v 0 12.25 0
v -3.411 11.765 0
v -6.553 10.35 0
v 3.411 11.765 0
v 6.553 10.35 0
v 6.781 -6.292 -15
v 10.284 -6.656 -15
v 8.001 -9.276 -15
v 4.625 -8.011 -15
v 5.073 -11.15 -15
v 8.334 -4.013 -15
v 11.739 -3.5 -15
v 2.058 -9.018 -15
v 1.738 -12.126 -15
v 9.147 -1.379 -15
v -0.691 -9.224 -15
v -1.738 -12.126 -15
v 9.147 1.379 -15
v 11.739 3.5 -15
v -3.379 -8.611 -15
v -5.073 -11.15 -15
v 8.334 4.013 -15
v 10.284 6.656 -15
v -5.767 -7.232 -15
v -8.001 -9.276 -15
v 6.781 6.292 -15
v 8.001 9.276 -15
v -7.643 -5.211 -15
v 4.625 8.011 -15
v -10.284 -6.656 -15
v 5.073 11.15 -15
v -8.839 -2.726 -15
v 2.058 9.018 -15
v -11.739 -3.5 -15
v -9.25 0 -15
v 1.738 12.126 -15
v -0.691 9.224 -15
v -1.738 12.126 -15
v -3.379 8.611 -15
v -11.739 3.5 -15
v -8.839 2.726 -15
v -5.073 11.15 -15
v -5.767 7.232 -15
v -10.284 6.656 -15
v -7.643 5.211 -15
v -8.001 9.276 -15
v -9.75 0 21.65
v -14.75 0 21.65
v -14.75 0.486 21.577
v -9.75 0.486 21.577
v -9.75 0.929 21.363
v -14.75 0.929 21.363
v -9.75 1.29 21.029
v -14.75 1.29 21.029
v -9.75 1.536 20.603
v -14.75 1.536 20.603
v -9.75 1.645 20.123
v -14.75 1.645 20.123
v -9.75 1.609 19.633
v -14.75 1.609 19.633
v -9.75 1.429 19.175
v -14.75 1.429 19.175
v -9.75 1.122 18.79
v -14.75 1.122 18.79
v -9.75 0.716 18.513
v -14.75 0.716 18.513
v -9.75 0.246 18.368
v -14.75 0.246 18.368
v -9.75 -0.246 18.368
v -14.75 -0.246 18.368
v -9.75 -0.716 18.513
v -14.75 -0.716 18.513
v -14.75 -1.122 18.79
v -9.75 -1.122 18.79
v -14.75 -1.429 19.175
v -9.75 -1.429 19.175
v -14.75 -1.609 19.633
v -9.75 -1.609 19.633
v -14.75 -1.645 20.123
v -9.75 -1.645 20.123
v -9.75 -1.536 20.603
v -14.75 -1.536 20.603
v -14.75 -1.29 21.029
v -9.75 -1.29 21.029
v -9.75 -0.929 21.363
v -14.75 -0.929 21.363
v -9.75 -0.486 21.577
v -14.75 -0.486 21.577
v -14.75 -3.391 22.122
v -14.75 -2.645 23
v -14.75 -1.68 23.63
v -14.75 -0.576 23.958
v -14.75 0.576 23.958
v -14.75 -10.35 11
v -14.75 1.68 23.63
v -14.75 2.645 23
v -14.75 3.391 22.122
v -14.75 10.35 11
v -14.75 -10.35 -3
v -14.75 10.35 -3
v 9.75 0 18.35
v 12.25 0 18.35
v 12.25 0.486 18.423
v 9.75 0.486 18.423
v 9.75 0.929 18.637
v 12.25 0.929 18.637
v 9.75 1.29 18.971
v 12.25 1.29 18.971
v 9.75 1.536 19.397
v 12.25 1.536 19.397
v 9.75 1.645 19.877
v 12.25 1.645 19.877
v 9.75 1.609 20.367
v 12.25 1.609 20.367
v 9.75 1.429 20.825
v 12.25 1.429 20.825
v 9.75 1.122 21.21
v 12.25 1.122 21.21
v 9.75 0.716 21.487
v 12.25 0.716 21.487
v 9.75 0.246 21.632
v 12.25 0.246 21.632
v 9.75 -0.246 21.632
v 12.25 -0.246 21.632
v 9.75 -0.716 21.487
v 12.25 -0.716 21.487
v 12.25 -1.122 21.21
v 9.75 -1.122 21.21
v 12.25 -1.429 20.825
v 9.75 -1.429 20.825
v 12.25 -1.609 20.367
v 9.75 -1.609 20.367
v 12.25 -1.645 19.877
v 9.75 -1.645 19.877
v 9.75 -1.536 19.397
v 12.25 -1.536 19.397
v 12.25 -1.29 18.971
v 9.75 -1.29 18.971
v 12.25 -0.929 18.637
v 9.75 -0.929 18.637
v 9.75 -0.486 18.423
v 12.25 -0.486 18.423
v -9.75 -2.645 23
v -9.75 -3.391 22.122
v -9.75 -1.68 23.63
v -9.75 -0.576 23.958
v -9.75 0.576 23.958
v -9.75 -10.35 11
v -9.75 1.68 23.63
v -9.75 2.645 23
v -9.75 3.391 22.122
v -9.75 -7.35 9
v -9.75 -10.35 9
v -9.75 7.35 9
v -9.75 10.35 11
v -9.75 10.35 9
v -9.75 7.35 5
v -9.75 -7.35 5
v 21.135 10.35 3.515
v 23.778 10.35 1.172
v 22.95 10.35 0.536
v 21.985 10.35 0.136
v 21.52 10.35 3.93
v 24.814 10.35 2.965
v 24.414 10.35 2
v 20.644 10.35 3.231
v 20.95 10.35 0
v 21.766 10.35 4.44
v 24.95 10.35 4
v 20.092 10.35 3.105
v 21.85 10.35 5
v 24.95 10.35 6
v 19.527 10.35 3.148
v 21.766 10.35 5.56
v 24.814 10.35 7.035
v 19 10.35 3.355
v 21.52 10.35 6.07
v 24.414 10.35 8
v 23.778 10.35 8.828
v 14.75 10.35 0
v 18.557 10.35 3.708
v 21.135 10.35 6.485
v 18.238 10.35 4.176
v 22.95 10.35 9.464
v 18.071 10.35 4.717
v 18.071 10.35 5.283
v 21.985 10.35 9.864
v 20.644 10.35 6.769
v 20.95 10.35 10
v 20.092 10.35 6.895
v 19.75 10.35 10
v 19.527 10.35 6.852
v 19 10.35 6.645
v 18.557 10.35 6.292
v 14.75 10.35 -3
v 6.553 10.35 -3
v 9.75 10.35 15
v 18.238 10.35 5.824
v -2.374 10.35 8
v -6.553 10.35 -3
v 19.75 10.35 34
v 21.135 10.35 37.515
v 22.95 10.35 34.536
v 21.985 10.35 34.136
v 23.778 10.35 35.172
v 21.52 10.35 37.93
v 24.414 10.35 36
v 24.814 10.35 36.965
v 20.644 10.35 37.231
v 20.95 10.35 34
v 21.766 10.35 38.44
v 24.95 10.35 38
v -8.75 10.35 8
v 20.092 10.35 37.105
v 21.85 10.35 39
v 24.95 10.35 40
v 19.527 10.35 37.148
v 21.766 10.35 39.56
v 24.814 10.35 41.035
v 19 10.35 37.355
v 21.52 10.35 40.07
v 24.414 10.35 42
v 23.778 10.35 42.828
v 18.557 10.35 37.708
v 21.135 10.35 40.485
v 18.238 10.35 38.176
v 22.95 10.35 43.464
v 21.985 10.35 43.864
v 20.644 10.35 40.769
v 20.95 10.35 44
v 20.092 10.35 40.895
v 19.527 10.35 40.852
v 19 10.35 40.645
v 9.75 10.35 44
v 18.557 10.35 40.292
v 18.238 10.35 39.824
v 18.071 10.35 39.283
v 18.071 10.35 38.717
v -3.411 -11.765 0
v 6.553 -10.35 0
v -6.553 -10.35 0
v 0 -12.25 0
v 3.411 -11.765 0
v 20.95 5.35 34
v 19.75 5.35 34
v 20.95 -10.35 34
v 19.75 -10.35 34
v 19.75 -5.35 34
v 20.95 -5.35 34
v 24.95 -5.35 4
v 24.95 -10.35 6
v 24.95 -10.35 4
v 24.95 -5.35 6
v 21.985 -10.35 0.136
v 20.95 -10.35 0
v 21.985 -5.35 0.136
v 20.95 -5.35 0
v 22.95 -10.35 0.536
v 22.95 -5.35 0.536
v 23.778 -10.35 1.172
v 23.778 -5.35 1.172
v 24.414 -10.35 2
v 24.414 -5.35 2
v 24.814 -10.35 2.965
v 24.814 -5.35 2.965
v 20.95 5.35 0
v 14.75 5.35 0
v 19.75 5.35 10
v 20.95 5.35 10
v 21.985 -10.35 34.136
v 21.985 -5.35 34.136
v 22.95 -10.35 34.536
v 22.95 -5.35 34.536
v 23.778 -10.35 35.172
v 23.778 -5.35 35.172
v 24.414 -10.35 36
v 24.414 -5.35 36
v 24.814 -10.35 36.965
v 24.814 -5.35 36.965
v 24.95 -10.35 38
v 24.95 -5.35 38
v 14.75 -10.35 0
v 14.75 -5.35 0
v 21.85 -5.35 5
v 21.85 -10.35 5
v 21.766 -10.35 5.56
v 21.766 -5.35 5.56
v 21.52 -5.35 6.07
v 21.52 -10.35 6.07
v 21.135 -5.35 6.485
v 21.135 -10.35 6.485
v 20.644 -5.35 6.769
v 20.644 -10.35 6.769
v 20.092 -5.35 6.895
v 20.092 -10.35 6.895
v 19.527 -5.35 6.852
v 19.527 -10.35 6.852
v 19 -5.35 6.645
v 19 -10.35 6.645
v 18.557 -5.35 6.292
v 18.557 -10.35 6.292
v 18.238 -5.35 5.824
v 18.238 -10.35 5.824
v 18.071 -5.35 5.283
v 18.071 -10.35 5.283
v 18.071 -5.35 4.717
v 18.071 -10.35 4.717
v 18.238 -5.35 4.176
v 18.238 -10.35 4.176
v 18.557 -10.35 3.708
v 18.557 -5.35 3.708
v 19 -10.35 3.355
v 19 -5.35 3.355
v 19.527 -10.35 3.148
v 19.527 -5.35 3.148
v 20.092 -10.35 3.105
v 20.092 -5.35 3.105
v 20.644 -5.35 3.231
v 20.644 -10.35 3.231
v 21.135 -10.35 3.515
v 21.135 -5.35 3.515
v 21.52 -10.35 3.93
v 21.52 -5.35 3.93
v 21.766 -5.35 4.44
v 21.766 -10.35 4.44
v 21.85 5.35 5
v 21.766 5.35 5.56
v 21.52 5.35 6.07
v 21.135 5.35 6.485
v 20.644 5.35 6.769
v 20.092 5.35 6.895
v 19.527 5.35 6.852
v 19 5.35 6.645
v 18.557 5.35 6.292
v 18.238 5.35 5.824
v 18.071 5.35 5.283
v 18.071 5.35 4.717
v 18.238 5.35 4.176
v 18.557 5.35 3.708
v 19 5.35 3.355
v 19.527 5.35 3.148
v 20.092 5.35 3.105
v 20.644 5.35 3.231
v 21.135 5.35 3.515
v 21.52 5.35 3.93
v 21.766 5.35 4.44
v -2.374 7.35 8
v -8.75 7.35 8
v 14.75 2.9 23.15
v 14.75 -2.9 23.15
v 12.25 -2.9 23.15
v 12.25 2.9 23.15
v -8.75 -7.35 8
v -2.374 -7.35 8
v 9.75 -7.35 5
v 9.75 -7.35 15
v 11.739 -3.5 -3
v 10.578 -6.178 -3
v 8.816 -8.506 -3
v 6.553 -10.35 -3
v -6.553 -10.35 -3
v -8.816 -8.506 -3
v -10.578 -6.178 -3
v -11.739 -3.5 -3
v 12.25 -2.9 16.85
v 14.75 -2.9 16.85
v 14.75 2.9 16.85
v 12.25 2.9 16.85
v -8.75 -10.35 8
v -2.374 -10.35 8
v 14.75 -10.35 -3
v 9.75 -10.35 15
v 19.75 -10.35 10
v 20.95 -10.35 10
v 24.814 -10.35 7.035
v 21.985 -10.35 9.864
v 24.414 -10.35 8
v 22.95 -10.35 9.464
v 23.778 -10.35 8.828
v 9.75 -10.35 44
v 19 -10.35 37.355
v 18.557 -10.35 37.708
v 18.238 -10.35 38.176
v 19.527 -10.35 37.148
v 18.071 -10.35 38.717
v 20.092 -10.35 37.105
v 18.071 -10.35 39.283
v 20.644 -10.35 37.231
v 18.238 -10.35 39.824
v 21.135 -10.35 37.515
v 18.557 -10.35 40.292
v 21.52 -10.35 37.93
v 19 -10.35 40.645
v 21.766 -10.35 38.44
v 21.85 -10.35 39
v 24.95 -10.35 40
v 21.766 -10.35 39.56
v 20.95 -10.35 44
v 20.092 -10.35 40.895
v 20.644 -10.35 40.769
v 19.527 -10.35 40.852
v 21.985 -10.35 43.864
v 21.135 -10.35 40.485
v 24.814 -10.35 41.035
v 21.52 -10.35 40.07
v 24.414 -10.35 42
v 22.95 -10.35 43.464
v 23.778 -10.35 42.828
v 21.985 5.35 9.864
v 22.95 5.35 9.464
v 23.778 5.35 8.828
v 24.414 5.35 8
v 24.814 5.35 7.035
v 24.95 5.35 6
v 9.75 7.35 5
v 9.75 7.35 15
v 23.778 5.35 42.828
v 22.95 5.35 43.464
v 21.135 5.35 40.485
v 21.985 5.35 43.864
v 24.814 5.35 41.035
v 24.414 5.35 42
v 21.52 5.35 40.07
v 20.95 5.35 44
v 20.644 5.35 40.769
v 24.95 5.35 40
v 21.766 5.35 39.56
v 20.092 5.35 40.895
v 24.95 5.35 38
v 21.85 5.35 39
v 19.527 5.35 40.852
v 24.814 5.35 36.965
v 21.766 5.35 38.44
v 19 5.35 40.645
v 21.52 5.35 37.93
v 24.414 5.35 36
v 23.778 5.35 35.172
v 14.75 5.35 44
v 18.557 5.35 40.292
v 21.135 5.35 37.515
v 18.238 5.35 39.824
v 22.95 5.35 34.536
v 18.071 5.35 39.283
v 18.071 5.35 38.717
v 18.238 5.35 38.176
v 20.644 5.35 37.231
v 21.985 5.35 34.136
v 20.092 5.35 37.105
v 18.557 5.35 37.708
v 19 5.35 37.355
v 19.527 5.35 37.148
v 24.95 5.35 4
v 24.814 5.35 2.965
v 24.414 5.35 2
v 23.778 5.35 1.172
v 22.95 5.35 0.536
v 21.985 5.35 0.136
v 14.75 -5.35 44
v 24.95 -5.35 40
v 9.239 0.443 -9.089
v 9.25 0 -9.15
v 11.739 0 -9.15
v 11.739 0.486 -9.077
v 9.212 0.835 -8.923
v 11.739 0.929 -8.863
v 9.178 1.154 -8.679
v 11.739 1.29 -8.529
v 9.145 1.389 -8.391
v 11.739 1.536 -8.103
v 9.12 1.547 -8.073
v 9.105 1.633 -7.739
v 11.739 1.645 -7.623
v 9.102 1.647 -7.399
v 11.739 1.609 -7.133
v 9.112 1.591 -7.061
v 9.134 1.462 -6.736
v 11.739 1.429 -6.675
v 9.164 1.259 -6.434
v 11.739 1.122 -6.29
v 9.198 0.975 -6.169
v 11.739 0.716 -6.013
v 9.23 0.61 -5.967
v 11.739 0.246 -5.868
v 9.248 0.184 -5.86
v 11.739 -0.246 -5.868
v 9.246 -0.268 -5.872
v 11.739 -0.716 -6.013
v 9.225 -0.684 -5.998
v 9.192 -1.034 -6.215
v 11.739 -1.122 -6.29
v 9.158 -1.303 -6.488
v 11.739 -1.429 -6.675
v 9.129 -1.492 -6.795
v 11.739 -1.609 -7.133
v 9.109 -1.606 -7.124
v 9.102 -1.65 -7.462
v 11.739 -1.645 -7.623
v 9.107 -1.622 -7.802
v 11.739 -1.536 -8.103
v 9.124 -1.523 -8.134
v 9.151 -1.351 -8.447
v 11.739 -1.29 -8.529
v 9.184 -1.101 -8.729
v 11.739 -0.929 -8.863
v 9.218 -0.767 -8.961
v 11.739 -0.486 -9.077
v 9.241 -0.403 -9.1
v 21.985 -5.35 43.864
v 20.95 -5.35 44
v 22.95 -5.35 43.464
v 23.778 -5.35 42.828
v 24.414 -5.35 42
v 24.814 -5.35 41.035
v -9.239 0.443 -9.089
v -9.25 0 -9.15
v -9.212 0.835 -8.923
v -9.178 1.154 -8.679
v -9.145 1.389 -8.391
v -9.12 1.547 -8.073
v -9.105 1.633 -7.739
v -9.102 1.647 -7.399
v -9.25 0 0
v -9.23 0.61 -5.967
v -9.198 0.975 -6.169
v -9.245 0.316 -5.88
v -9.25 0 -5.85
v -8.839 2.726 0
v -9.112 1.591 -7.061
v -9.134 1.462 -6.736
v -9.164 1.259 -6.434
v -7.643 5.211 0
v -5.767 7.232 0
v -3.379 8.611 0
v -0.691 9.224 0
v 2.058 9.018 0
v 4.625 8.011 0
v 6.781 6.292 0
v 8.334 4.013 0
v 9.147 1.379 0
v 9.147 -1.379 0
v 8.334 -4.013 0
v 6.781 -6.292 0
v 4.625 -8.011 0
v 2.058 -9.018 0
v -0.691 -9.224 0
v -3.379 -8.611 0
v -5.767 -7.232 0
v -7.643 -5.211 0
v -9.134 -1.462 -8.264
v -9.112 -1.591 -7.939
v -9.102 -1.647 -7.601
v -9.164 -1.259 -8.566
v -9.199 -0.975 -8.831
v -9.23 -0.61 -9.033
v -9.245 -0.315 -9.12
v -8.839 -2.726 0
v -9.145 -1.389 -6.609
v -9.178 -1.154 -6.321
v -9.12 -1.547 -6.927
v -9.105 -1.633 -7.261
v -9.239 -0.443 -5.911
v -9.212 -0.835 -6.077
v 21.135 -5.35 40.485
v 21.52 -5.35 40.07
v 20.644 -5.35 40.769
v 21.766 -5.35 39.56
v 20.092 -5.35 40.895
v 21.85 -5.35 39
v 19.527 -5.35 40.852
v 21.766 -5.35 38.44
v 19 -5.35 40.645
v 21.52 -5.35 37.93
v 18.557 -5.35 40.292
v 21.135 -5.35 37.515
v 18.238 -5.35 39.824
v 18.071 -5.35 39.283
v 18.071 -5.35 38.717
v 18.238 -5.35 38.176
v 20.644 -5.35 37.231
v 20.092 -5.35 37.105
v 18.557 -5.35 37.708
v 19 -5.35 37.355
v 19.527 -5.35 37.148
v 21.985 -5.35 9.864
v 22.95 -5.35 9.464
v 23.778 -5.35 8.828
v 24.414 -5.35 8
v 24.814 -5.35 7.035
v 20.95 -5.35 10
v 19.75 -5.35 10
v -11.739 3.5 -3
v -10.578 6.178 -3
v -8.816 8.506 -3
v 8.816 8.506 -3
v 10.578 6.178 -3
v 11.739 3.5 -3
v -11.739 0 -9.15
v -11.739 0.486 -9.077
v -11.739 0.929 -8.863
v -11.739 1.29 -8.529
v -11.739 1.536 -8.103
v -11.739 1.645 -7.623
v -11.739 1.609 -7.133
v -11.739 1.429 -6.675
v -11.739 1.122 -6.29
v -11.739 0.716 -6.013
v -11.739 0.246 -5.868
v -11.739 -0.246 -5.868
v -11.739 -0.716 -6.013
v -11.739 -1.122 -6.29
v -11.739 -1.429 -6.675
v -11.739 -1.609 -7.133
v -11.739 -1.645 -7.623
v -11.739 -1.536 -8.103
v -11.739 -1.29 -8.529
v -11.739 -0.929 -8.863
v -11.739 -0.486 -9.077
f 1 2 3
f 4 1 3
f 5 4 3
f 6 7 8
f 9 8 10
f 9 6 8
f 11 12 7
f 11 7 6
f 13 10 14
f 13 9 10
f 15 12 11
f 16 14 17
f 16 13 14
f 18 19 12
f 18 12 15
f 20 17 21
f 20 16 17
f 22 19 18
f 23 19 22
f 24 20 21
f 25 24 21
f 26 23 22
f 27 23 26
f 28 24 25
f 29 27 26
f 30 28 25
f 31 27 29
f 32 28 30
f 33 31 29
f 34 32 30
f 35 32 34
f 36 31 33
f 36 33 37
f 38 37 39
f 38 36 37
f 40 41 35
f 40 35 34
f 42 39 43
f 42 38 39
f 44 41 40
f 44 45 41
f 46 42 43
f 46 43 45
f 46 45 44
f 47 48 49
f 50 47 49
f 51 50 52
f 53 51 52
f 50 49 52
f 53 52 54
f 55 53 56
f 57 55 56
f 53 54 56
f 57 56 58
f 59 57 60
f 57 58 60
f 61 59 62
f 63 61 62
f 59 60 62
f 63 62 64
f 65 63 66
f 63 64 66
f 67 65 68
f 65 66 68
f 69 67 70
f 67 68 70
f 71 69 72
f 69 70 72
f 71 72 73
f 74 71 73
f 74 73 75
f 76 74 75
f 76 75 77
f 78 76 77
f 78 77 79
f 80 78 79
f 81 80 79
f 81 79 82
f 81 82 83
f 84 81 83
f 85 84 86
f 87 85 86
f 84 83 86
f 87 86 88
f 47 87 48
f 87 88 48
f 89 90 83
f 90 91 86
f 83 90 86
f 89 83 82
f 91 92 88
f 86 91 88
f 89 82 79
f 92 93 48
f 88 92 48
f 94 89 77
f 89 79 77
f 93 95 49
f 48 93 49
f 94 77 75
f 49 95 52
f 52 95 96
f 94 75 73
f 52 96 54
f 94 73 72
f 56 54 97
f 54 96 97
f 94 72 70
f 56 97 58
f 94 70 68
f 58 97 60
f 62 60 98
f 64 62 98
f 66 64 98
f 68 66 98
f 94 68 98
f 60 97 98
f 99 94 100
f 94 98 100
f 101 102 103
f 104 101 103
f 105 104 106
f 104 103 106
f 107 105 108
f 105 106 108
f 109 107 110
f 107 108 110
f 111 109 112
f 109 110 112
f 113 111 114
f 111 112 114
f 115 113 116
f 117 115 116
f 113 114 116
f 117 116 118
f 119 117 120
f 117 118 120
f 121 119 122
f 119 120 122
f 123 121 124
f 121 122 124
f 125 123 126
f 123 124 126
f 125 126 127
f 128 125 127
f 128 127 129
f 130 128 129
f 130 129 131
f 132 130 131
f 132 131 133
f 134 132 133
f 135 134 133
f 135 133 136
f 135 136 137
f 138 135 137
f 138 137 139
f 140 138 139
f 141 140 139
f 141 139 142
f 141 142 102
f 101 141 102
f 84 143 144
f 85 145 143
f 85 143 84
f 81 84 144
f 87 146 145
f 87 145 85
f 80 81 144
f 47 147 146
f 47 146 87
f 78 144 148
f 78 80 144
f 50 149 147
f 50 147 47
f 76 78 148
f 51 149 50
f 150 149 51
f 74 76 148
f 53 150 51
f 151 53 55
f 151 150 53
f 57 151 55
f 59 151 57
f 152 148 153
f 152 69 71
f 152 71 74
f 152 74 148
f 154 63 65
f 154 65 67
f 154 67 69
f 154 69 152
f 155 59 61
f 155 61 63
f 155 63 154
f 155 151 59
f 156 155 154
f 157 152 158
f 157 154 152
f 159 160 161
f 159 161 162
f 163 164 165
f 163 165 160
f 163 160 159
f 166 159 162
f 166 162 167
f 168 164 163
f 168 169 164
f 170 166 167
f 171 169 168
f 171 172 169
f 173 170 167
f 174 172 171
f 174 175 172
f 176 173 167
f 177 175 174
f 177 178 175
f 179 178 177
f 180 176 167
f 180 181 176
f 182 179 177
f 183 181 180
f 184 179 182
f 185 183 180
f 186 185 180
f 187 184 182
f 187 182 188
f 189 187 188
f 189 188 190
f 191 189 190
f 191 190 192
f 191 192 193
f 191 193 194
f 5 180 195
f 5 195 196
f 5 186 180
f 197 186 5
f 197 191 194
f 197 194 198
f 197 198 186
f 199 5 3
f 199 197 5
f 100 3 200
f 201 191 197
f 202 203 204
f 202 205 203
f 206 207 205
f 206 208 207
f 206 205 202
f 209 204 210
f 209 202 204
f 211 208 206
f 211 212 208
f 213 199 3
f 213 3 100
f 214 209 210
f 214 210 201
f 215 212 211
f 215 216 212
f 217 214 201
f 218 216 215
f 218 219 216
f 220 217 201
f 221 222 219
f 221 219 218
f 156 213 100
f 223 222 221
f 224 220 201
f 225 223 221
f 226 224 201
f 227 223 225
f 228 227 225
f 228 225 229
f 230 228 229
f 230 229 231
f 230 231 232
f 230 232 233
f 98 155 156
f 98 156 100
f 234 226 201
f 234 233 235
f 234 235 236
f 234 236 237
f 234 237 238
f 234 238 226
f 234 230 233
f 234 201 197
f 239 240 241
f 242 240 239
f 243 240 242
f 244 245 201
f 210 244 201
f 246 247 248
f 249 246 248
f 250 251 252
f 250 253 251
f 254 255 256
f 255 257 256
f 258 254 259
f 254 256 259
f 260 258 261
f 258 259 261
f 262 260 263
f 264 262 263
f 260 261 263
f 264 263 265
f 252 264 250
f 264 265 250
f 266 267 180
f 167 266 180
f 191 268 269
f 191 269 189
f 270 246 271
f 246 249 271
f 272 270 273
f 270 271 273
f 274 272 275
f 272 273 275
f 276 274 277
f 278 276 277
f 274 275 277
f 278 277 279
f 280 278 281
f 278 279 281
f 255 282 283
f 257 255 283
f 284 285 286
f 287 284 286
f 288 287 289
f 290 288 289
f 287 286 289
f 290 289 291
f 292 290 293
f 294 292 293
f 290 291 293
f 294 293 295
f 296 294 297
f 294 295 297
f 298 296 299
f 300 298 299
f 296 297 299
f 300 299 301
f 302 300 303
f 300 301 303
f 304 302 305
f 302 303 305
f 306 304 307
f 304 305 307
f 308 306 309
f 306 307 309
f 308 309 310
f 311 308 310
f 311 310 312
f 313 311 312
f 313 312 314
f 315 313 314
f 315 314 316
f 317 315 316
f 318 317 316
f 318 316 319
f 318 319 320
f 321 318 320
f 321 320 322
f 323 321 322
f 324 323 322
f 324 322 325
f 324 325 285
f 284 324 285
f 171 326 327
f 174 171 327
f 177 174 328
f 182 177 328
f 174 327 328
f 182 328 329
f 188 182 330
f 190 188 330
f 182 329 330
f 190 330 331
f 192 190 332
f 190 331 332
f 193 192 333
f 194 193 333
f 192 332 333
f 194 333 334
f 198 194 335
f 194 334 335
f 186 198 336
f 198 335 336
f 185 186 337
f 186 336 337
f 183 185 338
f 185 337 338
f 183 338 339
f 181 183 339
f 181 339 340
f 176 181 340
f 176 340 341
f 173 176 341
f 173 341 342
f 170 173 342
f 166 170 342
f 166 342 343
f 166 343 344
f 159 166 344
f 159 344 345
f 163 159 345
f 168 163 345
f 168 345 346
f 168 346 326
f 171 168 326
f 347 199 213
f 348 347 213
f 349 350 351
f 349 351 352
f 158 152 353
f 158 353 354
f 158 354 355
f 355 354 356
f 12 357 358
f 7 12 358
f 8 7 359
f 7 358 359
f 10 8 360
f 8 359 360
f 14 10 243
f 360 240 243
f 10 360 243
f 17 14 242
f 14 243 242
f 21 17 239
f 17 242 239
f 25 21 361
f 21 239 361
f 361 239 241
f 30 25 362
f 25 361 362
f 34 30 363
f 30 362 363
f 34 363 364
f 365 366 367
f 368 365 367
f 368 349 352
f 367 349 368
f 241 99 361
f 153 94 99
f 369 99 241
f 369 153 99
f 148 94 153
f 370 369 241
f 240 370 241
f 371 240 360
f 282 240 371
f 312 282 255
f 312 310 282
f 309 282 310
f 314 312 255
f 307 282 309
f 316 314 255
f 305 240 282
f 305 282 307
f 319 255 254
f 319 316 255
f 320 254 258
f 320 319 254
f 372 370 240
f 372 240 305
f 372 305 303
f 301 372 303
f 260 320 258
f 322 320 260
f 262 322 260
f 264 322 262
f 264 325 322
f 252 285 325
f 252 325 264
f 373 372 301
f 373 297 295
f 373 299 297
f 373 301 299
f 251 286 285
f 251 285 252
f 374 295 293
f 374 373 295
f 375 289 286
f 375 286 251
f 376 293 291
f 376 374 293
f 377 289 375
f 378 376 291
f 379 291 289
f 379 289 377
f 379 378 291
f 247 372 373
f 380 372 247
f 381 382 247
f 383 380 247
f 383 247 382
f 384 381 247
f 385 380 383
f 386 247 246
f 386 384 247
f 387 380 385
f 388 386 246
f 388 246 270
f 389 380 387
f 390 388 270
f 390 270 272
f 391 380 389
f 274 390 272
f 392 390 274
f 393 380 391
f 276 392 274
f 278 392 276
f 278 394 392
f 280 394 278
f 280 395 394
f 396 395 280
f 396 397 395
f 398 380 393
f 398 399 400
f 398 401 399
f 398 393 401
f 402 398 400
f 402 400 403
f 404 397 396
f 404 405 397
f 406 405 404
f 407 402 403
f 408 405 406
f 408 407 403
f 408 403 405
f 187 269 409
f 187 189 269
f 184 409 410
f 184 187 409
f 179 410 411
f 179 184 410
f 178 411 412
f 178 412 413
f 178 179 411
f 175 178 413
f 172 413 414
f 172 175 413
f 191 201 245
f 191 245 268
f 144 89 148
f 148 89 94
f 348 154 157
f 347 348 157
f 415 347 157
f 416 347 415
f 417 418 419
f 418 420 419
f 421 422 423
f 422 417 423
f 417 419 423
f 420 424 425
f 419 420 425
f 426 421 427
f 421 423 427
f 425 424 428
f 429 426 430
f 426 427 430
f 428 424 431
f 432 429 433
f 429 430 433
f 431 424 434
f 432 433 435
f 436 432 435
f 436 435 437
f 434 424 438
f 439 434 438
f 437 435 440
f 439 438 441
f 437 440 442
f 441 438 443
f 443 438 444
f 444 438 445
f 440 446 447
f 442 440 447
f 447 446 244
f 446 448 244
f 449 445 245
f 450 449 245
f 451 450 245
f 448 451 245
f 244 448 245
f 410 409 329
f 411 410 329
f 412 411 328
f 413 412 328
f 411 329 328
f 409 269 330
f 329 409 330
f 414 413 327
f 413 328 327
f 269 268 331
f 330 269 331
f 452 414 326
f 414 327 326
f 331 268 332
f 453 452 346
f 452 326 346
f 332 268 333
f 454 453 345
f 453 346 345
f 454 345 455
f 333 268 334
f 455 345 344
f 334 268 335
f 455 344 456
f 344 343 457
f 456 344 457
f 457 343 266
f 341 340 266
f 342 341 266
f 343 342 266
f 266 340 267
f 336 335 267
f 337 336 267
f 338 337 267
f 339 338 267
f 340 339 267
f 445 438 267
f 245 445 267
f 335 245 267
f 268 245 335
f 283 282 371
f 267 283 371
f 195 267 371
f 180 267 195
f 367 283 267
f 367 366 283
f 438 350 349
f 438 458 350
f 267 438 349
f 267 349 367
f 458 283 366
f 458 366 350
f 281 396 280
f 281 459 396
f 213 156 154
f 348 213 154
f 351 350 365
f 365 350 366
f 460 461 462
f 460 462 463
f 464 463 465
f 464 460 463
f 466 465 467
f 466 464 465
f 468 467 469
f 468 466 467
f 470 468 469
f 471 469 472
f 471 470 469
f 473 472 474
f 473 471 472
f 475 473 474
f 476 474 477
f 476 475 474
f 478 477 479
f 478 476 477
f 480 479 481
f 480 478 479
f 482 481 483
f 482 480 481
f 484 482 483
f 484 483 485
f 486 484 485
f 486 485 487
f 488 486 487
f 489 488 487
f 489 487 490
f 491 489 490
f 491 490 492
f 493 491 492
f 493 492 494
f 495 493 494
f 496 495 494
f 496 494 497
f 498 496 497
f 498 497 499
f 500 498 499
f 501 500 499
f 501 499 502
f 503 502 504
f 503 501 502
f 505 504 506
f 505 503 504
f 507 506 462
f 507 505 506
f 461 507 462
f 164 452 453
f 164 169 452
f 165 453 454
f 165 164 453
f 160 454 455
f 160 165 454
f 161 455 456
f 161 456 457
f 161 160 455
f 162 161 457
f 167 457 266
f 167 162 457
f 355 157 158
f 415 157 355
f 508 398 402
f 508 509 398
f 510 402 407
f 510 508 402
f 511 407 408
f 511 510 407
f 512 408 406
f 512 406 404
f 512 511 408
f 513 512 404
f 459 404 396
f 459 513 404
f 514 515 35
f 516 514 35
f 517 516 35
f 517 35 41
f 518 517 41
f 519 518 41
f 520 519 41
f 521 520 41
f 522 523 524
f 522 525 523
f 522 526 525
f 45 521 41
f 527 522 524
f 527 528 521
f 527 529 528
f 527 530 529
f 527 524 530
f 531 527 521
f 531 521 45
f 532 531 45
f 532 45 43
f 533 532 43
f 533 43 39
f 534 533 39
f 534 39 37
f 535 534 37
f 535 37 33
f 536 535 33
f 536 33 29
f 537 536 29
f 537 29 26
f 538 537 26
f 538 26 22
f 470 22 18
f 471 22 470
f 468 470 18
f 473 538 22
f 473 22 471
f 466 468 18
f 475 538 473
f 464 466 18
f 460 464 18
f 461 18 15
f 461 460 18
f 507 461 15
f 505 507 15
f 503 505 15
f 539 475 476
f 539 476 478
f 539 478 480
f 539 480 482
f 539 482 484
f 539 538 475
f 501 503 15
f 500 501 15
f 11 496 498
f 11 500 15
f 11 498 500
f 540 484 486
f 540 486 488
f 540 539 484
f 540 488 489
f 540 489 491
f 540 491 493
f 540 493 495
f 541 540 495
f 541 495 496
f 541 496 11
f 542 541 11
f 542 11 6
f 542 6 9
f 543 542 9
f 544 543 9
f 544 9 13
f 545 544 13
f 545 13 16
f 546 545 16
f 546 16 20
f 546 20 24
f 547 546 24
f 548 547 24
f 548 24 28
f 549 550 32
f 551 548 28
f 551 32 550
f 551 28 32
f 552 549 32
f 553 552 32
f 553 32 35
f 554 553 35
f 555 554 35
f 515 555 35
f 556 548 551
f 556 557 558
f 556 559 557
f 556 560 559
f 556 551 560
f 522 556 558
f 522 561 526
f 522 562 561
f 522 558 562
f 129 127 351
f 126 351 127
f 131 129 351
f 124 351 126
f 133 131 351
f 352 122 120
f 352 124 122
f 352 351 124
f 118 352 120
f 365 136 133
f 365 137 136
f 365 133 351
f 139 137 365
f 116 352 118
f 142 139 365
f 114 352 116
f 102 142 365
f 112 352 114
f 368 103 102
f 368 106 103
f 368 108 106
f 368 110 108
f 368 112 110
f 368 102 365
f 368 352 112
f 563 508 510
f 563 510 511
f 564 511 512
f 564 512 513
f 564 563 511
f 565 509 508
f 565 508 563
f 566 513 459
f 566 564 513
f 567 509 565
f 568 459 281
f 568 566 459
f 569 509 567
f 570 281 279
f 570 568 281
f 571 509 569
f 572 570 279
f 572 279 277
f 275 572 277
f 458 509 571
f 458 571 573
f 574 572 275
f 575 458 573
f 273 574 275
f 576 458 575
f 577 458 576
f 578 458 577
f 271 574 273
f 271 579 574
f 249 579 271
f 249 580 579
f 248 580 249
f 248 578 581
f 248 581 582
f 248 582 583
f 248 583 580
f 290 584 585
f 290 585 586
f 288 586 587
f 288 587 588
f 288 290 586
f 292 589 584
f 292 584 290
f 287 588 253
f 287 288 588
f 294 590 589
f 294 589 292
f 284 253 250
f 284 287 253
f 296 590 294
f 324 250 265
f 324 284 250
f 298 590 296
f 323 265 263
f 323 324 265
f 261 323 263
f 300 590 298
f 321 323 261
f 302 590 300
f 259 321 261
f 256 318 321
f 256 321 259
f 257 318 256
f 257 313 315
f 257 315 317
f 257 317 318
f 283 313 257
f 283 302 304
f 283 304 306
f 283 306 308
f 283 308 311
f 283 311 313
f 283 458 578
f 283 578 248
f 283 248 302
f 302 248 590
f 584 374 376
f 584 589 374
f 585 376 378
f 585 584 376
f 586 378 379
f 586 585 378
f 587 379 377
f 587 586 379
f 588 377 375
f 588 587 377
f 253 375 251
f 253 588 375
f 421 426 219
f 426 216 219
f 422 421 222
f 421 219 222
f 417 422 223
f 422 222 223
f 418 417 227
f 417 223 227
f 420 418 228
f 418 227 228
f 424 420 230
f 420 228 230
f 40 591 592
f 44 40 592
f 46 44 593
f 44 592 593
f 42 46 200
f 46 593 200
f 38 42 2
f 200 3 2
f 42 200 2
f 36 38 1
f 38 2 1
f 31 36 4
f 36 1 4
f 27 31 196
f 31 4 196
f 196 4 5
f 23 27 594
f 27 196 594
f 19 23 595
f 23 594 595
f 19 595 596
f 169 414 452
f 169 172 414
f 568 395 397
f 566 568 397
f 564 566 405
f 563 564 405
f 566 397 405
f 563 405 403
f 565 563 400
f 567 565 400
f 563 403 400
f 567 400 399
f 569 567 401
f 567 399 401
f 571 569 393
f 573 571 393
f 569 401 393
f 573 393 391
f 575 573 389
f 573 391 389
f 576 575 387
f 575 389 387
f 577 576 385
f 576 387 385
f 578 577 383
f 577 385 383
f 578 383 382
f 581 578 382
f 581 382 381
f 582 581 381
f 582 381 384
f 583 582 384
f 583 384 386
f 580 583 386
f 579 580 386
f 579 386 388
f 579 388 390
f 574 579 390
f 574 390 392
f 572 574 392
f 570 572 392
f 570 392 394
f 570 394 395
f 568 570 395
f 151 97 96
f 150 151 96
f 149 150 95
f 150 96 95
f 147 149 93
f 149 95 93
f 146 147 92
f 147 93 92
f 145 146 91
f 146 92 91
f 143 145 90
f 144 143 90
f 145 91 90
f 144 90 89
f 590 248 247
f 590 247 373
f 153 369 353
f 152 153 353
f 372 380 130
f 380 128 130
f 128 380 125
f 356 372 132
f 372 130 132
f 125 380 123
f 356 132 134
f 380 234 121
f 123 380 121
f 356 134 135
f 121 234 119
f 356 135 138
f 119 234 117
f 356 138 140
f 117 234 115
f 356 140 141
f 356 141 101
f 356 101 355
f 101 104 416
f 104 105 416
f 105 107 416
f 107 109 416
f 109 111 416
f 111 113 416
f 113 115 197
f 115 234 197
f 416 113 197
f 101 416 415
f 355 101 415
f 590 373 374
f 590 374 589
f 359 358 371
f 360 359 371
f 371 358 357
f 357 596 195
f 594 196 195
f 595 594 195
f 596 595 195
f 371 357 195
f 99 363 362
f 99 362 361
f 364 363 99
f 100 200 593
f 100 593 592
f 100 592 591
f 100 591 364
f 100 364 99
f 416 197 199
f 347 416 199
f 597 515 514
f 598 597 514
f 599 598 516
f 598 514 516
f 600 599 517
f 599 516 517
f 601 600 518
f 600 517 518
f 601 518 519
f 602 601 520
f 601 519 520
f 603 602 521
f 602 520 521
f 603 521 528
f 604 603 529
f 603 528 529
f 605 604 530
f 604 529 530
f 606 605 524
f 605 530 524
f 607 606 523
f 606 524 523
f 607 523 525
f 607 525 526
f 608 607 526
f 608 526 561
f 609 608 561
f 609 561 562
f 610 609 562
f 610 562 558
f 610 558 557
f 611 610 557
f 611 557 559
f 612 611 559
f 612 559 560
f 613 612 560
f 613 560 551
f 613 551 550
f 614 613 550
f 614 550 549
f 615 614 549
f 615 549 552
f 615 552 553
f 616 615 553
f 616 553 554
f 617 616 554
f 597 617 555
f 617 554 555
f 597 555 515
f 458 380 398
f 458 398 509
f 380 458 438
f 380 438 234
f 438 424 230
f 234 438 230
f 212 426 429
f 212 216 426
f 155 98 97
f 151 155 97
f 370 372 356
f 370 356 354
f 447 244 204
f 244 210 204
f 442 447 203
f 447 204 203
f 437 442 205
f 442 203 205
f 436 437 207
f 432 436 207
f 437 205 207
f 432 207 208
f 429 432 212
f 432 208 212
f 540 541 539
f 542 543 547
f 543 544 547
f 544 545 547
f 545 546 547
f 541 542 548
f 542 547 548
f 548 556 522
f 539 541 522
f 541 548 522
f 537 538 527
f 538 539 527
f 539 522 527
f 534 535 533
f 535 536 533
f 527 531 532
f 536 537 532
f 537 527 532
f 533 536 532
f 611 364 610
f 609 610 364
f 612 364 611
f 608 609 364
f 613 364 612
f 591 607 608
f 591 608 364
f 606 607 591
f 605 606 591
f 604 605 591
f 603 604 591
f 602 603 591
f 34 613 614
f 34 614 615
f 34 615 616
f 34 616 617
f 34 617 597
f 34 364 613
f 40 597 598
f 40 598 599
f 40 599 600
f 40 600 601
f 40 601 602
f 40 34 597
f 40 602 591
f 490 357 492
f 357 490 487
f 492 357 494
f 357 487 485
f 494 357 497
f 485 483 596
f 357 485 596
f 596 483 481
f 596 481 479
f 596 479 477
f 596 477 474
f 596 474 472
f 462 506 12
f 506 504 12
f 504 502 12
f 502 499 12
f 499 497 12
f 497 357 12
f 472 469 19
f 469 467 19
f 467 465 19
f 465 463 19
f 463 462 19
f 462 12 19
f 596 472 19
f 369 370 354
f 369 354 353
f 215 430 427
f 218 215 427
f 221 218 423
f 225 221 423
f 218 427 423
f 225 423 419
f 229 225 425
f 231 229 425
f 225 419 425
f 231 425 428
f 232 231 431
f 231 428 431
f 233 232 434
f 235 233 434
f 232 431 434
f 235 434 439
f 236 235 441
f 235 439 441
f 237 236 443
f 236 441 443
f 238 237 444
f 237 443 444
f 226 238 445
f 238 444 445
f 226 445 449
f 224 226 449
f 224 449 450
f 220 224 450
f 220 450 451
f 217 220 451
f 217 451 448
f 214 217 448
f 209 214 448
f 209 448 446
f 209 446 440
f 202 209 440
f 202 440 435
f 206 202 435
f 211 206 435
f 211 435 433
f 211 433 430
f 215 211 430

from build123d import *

# Parameters (mm, degrees)
SKETCH_1_R               = 6.325
EXTRUDE_1_DEPTH          = 15
SKETCH_2_W               = 29.5
SKETCH_2_H               = 20.7
EXTRUDE_2_DEPTH          = 5
SKETCH_3_W               = 39
SKETCH_3_H               = 20.7
SKETCH_3_R               = 1.65
EXTRUDE_3_DEPTH          = 5
SKETCH_4_W               = 10
SKETCH_4_H               = 5
EXTRUDE_4_DEPTH          = 10.2
SKETCH_5_R               = 1.9
CUT_EXTRUDE_1_DEPTH      = 21.7
FILLET_1_R               = 4
SKETCH_8_W               = 24
SKETCH_8_H               = 5
EXTRUDE_6_DEPTH          = 5
SKETCH_9_R               = 1.65
EXTRUDE_7_DEPTH          = 5
EXTRUDE_5_DEPTH          = 3
CHAMFER_2_SIZE           = 1
SKETCH_10_W              = 6.3
SKETCH_10_H              = 5.8
CUT_EXTRUDE_2_DEPTH      = 2.5
SKETCH_11_R              = 1.65
CUT_EXTRUDE_3_DEPTH      = 25.95
CUT_EXTRUDE_3_DEPTH_BACK = 15.75
CHAMFER_3_SIZE           = 1
CUT_EXTRUDE_4_DEPTH      = 1
CUT_EXTRUDE_4_DEPTH_BACK = 21.7
SKETCH_13_R              = 12.25
SKETCH_13_R_2            = 9.25
EXTRUDE_8_DEPTH          = 15
SKETCH_14_R              = 1.65
CUT_EXTRUDE_5_DEPTH      = 25.95
CUT_EXTRUDE_5_DEPTH_BACK = 15.75
SKETCH_15_W              = 4.137033229
SKETCH_15_H              = 7
CUT_EXTRUDE_6_DEPTH      = 15
EXTRUDE_9_DEPTH          = 3


with BuildPart() as part:
    # ｽｹｯﾁ1 → ﾎﾞｽ - 押し出し1 (new body)
    with BuildSketch(Plane.XY):
        Circle(SKETCH_1_R)
    extrude(amount=-EXTRUDE_1_DEPTH)

    # ｽｹｯﾁ2 → ﾎﾞｽ - 押し出し2 (add)
    with BuildSketch(Plane.XY):
        Rectangle(SKETCH_2_W, SKETCH_2_H)
    extrude(amount=EXTRUDE_2_DEPTH)

    # ｽｹｯﾁ3 → ﾎﾞｽ - 押し出し3 (add)
    with BuildSketch(Plane(origin=(14.75, 0, 0), x_dir=(0, 0, -1), z_dir=(1, 0, 0))):
        with Locations((-24.5, 0)):
            Rectangle(SKETCH_3_W, SKETCH_3_H)
        with Locations((-20, 0)):
            Circle(SKETCH_3_R, mode=Mode.SUBTRACT)
    extrude(amount=-EXTRUDE_3_DEPTH)

    # ｽｹｯﾁ4 → ﾎﾞｽ - 押し出し4 (add)
    with BuildSketch(Plane(origin=(14.75, 0, 0), x_dir=(0, 0, -1), z_dir=(1, 0, 0))):
        with Locations((-5, 7.85)):
            Rectangle(SKETCH_4_W, SKETCH_4_H)
        with Locations((-5, -7.85)):
            Rectangle(SKETCH_4_W, SKETCH_4_H)
        with Locations((-39, 7.85)):
            Rectangle(SKETCH_4_W, SKETCH_4_H)
        with Locations((-39, -7.85)):
            Rectangle(SKETCH_4_W, SKETCH_4_H)
    extrude(amount=EXTRUDE_4_DEPTH)

    # ｽｹｯﾁ5 → ｶｯﾄ - 押し出し1 (cut, through all)
    with BuildSketch(Plane.XZ.offset(10.35)):
        with Locations((19.95, 5)):
            Circle(SKETCH_5_R)
        with Locations((19.95, 39)):
            Circle(SKETCH_5_R)
    extrude(amount=-CUT_EXTRUDE_1_DEPTH, mode=Mode.SUBTRACT)

    # ﾌｨﾚｯﾄ1
    fillet_1_edges = [part.edges().sort_by_distance(p)[0] for p in [
        (24.95, 7.85, 0),
        (24.95, 7.85, 10),
        (24.95, -7.85, 0),
        (24.95, -7.85, 10),
        (24.95, -7.85, 44),
        (24.95, -7.85, 34),
        (24.95, 7.85, 44),
        (24.95, 7.85, 34),
    ]]
    fillet(fillet_1_edges, radius=FILLET_1_R)

    # ｽｹｯﾁ8 → ﾎﾞｽ - 押し出し6 (add)
    with BuildSketch(Plane(origin=(14.75, 0, 0), x_dir=(0, 0, -1), z_dir=(1, 0, 0))):
        with Locations((-22, 7.85)):
            Rectangle(SKETCH_8_W, SKETCH_8_H)
        with Locations((-22, -7.85)):
            Rectangle(SKETCH_8_W, SKETCH_8_H)
    extrude(amount=EXTRUDE_6_DEPTH)

    # ｽｹｯﾁ9 → ﾎﾞｽ - 押し出し7 (add)
    with BuildSketch(Plane.ZY.offset(14.75)):
        with BuildLine():
            Line((5, 10.35), (11, 10.35))
            Line((11, 10.35), (22.121751649, 3.390895153))
            ThreePointArc((22.121751649, 3.390895153), (24, 0), (22.121751649, -3.390895153))
            Line((22.121751649, -3.390895153), (11, -10.35))
            Line((11, -10.35), (5, -10.35))
            Line((5, -10.35), (5, 10.35))
        make_face()
        with Locations((20, 0)):
            Circle(SKETCH_9_R, mode=Mode.SUBTRACT)
    extrude(amount=-EXTRUDE_7_DEPTH)

    # ｽｹｯﾁ6 → ﾎﾞｽ - 押し出し5 (add)
    with BuildSketch(Plane.XZ.offset(10.35)):
        Polygon((-9.75, 5), (9.75, 5), (9.75, 15), (-2.374355653, 8), (-9.75, 8), align=None)
    extrude_5 = extrude(amount=-EXTRUDE_5_DEPTH)

    # ﾐﾗｰ1: ﾎﾞｽ - 押し出し5 across plane
    add(extrude_5.mirror(Plane.ZX))

    # 面取り2
    chamfer_2_edges = [part.edges().sort_by_distance(p)[0] for p in [
        (-9.75, -8.85, 8),
        (-9.75, 8.85, 8),
    ]]
    chamfer(chamfer_2_edges, length=CHAMFER_2_SIZE)

    # ｽｹｯﾁ10 → ｶｯﾄ - 押し出し2 (cut)
    with BuildSketch(Plane(origin=(14.75, 0, 0), x_dir=(0, 0, -1), z_dir=(1, 0, 0))):
        with Locations((-20, 0)):
            Rectangle(SKETCH_10_W, SKETCH_10_H)
    extrude(amount=-CUT_EXTRUDE_2_DEPTH, mode=Mode.SUBTRACT)

    # ｽｹｯﾁ11 → ｶｯﾄ - 押し出し3 (cut, two sides)
    with BuildSketch(Plane(origin=(0, 0, 0), x_dir=(0, 0, -1), z_dir=(1, 0, 0))) as cut_extrude_3_sk:
        with Locations((7.5, 0)):
            Circle(SKETCH_11_R)
    extrude(amount=CUT_EXTRUDE_3_DEPTH, mode=Mode.SUBTRACT)
    extrude(cut_extrude_3_sk.sketch, amount=-CUT_EXTRUDE_3_DEPTH_BACK, mode=Mode.SUBTRACT)

    # 面取り3
    chamfer_3_edges = [part.edges().sort_by_distance(p)[0] for p in [
        (-6.325, 0, -15),
    ]]
    chamfer(chamfer_3_edges, length=CHAMFER_3_SIZE)

    # ｽｹｯﾁ12 → ｶｯﾄ - 押し出し4 (cut, two sides)
    with BuildSketch(Plane(origin=(0, 10.35, 0), x_dir=(1, 0, 0), z_dir=(0, 1, 0))) as cut_extrude_4_sk:
        Polygon((-157.887970151, 0), (-20.856584832, 0), (30.621949215, 0), (167.653334534, 0), (167.653334534, 274.062770638), (-157.887970151, 274.062770638), align=None)
    extrude(amount=CUT_EXTRUDE_4_DEPTH, mode=Mode.SUBTRACT)
    extrude(cut_extrude_4_sk.sketch, amount=-CUT_EXTRUDE_4_DEPTH_BACK, mode=Mode.SUBTRACT)

    # ｽｹｯﾁ13 → ﾎﾞｽ - 押し出し8 (add)
    with BuildSketch(Plane(origin=(0, 0, 0), x_dir=(-1, 0, 0), z_dir=(0, 0, -1))):
        Circle(SKETCH_13_R)
        Circle(SKETCH_13_R_2, mode=Mode.SUBTRACT)
    extrude(amount=EXTRUDE_8_DEPTH)

    # ｽｹｯﾁ14 → ｶｯﾄ - 押し出し5 (cut, two sides)
    with BuildSketch(Plane(origin=(0, 0, 0), x_dir=(0, 0, -1), z_dir=(1, 0, 0))) as cut_extrude_5_sk:
        with Locations((7.5, 0)):
            Circle(SKETCH_14_R)
    extrude(amount=CUT_EXTRUDE_5_DEPTH, mode=Mode.SUBTRACT)
    extrude(cut_extrude_5_sk.sketch, amount=-CUT_EXTRUDE_5_DEPTH_BACK, mode=Mode.SUBTRACT)

    # ｽｹｯﾁ15 → ｶｯﾄ - 押し出し6 (cut)
    with BuildSketch(Plane(origin=(0, 0, -15), x_dir=(-1, 0, 0), z_dir=(0, 0, -1))):
        with Locations((-13.807873497, 0)):
            Rectangle(SKETCH_15_W, SKETCH_15_H)
        with Locations((13.807873497, 0)):
            Rectangle(SKETCH_15_W, SKETCH_15_H)
    extrude(amount=-CUT_EXTRUDE_6_DEPTH, mode=Mode.SUBTRACT)

    # ｽｹｯﾁ16 → ﾎﾞｽ - 押し出し9 (add)
    with BuildSketch(Plane(origin=(0, 0, 0), x_dir=(-1, 0, 0), z_dir=(0, 0, -1))):
        with BuildLine():
            Line((-11.739356882, 3.5), (-11.739356882, -3.5))
            ThreePointArc((-11.739356882, -3.5), (-9.766367935, -7.394630306), (-6.55286197, -10.35))
            Line((-6.55286197, -10.35), (-14.75, -10.35))
            Line((-14.75, -10.35), (-14.75, 10.35))
            Line((-14.75, 10.35), (-6.55286197, 10.35))
            ThreePointArc((-6.55286197, 10.35), (-9.766367935, 7.394630306), (-11.739356882, 3.5))
        make_face()
        with BuildLine():
            Line((6.55286197, -10.35), (14.75, -10.35))
            Line((14.75, -10.35), (14.75, 10.35))
            Line((14.75, 10.35), (6.55286197, 10.35))
            ThreePointArc((6.55286197, 10.35), (9.766367935, 7.394630306), (11.739356882, 3.5))
            Line((11.739356882, 3.5), (11.739356882, -3.5))
            ThreePointArc((11.739356882, -3.5), (9.766367935, -7.394630306), (6.55286197, -10.35))
        make_face()
    extrude(amount=EXTRUDE_9_DEPTH)


solid = part.part
